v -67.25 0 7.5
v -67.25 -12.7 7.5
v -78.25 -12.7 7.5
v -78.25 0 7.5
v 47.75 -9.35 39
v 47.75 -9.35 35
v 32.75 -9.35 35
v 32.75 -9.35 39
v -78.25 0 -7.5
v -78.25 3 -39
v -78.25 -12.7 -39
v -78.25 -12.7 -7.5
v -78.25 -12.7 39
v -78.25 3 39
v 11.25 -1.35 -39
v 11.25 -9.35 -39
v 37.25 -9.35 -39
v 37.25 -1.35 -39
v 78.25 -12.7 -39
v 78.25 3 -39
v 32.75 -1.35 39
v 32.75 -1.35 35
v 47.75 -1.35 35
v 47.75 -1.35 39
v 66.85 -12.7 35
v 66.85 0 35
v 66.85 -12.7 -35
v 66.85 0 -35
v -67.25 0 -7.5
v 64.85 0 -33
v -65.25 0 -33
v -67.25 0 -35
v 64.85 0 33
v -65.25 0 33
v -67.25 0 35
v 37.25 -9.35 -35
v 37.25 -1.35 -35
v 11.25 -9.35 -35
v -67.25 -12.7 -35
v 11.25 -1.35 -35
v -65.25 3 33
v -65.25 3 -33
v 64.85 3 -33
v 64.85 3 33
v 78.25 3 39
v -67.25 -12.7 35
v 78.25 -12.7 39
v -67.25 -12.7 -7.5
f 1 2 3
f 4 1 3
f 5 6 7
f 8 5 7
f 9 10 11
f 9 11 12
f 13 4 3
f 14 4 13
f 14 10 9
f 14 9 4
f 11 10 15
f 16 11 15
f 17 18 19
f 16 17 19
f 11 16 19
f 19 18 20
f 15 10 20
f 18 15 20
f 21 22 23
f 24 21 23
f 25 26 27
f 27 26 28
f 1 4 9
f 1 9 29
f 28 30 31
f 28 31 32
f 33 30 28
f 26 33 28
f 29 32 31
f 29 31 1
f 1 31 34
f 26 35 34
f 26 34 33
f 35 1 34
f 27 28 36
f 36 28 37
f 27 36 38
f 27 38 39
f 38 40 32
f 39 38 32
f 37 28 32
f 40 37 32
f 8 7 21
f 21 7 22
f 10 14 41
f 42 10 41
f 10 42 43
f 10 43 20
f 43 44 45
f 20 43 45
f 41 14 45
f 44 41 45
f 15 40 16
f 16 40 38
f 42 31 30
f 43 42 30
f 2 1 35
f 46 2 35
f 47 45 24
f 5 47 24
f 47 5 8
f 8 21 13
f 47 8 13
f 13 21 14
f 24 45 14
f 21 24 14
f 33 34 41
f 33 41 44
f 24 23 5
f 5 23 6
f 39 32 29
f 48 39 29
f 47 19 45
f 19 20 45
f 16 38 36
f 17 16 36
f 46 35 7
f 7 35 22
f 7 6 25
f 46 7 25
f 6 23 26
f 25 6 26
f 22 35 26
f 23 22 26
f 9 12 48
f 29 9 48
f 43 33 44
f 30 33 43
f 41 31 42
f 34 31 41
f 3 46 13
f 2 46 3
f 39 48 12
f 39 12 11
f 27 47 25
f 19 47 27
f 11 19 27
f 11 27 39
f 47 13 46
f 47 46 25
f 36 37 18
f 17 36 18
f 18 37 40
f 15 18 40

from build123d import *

# Parameters (mm, degrees)
F0_W          = 130.5
F0_H          = 2
F1_DEPTH      = 3
F0_W_2        = 142.5
F0_H_2        = 78
F0_W_3        = 7
F2_DEPTH      = 3
F2_DEPTH_BACK = 12.7
F3_W          = 5.5
F3_H          = 7.5
F4_DEPTH      = 12.7
F6_DEPTH      = 4.001
F8_DEPTH      = 4.001
F9_DEPTH      = 0.4
F10_DEPTH     = 2
F11_DEPTH     = 2


with BuildPart() as f1:
    # F0 (on Front) → F1 (new body)
    with BuildSketch(Plane.XZ):
        Polygon((67.25, 35), (65.25, 35), (65.25, 33), (65.25, -33), (65.25, -35), (67.25, -35), align=None)
        with Locations((0, 34)):
            Rectangle(F0_W, F0_H)
        Polygon((-65.25, 35), (-67.25, 35), (-67.25, -35), (-65.25, -35), (-65.25, -33), (-65.25, 33), align=None)
        with Locations((0, -34)):
            Rectangle(F0_W, F0_H)
    extrude(amount=-F1_DEPTH)

    # F0 (on Front) → F2 (join, two sides)
    with BuildSketch(Plane.XZ) as f2_sk:
        Rectangle(F0_W_2, F0_H_2)
        Polygon((-67.25, -35), (-67.25, 35), (-65.25, 35), (65.25, 35), (67.25, 35), (67.25, -35), (65.25, -35), (-65.25, -35), align=None, mode=Mode.SUBTRACT)
        with Locations((-74.75, 0)):
            Rectangle(F0_W_3, F0_H_2)
        with Locations((74.75, 0)):
            Rectangle(F0_W_3, F0_H_2)
    extrude(amount=-F2_DEPTH)
    extrude(f2_sk.sketch, amount=F2_DEPTH_BACK)

    # F3 (on face) → F4 (cut)
    with BuildSketch(Plane.XZ.offset(12.7)):
        with Locations((-75.5, 3.75)):
            Rectangle(F3_W, F3_H)
        with Locations((-70, 3.75)):
            Rectangle(F3_W, F3_H)
        with Locations((-70, -3.75)):
            Rectangle(F3_W, F3_H)
        with Locations((-75.5, -3.75)):
            Rectangle(F3_W, F3_H)
    extrude(amount=-F4_DEPTH, mode=Mode.SUBTRACT)

    # F5 (on face) → F6 (cut, through all)
    with BuildSketch(Plane(origin=(0, 0, 35), x_dir=(1, 0, 0), z_dir=(0, 0, -1))):
        Polygon((47.75, 3.35), (47.75, 6.35), (47.75, 9.35), (32.75, 9.35), (32.75, 3.35), align=None)
    extrude(amount=-F6_DEPTH, mode=Mode.SUBTRACT)

    # F7 (on face) → F8 (cut, through all)
    with BuildSketch(Plane.XY.offset(-35)):
        Polygon((37.25, -9.35), (37.25, -6.35), (37.25, -3.35), (11.25, -3.35), (11.25, -9.35), align=None)
    extrude(amount=-F8_DEPTH, mode=Mode.SUBTRACT)

    # F9 (add): faces of the model
    f9_faces = [f1.faces().sort_by_distance(p)[0] for p in [
        (67.25, -6.35, 0),
        (65.25, 1.5, 0),
    ]]
    extrude(f9_faces, amount=F9_DEPTH)

    # F10 (cut): a face of the model
    f10_faces = [f1.faces().sort_by_distance(p)[0] for p in [
        (24.25, -3.35, -37),
    ]]
    extrude(f10_faces, amount=-F10_DEPTH, mode=Mode.SUBTRACT)

    # F11 (cut): a face of the model
    f11_faces = [f1.faces().sort_by_distance(p)[0] for p in [
        (40.25, -3.35, 37),
    ]]
    extrude(f11_faces, amount=-F11_DEPTH, mode=Mode.SUBTRACT)


solid = f1.part
